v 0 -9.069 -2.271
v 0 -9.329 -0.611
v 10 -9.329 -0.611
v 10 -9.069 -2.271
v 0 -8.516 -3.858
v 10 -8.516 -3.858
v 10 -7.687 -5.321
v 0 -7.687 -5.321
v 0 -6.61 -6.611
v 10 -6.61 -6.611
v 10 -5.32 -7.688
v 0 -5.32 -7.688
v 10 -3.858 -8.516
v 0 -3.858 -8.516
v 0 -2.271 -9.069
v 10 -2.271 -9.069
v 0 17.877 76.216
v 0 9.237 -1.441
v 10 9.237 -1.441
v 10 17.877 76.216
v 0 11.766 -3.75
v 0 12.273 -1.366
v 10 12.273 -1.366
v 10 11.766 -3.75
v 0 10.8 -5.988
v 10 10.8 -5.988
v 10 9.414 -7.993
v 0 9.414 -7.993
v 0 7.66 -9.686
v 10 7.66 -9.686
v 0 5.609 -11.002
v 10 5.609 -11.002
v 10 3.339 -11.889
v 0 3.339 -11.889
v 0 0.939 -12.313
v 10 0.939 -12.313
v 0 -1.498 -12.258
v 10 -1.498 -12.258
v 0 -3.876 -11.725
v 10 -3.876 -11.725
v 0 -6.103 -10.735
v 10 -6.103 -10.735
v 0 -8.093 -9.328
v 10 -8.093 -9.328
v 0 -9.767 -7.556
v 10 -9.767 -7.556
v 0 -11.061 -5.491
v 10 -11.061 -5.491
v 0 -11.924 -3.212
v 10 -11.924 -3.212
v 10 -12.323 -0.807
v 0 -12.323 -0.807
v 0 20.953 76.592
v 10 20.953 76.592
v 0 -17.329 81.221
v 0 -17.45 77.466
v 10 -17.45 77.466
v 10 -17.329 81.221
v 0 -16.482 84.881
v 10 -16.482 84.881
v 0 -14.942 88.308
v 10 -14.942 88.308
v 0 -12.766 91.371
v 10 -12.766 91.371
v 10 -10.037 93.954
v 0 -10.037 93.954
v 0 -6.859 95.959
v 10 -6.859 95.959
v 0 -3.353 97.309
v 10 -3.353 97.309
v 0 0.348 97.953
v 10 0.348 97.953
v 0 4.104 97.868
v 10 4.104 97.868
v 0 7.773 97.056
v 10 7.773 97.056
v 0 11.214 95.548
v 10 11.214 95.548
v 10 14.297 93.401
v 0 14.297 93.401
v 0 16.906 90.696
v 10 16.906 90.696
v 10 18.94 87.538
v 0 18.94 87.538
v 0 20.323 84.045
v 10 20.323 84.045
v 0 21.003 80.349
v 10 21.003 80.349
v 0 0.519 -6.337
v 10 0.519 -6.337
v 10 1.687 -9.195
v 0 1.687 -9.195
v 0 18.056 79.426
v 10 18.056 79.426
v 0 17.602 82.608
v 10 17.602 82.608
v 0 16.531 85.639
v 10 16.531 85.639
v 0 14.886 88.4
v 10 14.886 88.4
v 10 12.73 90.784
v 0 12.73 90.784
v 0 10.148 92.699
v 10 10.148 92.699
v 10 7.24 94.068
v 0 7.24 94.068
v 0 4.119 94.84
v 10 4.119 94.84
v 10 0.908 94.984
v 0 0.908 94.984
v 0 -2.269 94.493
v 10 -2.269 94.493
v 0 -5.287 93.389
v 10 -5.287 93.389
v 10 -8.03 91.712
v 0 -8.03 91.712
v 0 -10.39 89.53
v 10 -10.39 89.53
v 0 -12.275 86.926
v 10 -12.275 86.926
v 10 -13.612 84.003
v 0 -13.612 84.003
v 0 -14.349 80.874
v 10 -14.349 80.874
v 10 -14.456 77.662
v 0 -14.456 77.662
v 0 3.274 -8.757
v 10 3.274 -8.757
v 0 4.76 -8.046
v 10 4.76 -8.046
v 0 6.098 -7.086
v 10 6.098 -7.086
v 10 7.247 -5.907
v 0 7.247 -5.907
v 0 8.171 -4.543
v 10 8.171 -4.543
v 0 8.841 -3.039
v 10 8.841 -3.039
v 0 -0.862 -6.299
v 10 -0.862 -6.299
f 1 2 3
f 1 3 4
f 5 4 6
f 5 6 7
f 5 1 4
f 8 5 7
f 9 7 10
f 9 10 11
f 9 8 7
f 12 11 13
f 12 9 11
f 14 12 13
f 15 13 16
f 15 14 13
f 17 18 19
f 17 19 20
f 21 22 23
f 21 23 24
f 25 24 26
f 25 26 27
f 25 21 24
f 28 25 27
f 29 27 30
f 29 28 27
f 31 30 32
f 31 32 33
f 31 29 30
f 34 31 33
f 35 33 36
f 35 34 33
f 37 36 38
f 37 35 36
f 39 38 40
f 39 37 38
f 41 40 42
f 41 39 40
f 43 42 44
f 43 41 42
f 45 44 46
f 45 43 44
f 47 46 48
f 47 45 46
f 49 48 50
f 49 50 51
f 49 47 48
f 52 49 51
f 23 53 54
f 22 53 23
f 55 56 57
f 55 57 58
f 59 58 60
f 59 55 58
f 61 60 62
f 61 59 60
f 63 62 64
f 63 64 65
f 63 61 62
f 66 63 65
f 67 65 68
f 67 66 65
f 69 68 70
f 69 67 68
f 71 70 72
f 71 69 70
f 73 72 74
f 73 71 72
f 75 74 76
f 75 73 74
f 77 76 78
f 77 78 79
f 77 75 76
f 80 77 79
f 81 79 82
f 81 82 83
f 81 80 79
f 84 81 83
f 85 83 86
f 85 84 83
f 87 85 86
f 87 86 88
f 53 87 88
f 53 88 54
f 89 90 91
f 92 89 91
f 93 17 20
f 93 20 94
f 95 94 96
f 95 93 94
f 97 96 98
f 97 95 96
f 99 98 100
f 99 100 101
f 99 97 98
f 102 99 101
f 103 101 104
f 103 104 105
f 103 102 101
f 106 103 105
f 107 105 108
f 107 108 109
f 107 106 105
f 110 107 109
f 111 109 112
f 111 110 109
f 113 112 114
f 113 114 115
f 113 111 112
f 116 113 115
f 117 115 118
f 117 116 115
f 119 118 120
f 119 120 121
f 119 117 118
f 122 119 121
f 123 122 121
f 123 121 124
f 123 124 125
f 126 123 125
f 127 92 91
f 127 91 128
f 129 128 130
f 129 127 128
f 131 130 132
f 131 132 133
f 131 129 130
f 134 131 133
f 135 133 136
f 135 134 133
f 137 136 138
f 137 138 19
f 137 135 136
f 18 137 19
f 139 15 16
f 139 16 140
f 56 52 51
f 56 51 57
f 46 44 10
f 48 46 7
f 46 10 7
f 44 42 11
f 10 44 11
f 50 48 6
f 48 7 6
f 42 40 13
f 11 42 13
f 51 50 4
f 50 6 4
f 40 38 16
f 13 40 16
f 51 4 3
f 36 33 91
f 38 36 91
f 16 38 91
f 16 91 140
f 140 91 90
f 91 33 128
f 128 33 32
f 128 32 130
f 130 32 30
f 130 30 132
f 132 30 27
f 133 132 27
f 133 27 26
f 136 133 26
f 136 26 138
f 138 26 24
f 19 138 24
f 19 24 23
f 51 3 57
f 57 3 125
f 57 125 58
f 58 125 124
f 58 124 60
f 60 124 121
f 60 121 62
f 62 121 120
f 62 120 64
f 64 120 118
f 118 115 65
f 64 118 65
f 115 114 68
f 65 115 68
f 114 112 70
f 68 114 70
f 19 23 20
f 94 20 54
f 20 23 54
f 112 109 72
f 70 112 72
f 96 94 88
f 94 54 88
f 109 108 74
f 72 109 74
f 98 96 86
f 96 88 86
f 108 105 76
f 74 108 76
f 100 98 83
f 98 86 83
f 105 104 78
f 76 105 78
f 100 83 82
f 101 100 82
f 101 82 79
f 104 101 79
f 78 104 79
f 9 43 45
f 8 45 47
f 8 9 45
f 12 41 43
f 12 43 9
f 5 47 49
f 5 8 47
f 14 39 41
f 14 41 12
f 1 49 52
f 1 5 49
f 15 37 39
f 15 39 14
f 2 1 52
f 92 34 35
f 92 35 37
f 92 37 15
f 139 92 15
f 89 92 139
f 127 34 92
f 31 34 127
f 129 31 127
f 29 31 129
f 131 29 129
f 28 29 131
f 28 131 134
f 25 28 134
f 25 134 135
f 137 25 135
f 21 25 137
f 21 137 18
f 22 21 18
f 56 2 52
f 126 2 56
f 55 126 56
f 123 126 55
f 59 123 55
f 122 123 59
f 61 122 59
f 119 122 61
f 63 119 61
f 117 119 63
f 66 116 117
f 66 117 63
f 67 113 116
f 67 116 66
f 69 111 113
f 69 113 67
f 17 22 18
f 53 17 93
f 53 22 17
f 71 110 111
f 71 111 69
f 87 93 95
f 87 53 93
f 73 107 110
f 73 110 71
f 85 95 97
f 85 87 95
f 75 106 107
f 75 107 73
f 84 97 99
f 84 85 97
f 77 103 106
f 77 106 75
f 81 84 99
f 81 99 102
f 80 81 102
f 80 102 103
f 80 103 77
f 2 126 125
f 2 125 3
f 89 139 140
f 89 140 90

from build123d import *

# Parameters (mm, degrees)
BOSS_EXTRUDE1_DEPTH = 10
BOSS_EXTRUDE2_DEPTH = 10


with BuildPart() as part:
    # Sketch1 → Boss-Extrude1 (new body)
    with BuildSketch(Plane(origin=(0, 0, 0), x_dir=(0, 0, -1), z_dir=(1, 0, 0))):
        with BuildLine():
            Line((-76.592461771, 20.953089015), (1.366493243, 12.273096648))
            ThreePointArc((1.366493243, 12.273096648), (12.345744217, -0.280722022), (0.807229086, -12.322523537))
            Line((0.807229086, -12.322523537), (-77.465686513, -17.45005881))
            ThreePointArc((-77.465686513, -17.45005881), (-98.002496493, 2.228416408), (-76.592461771, 20.953089015))
        make_face()
        with BuildLine():
            Line((-77.661791455, -14.456475197), (0.611124144, -9.328939923))
            ThreePointArc((0.611124144, -9.328939923), (9.339609214, -0.417483589), (1.441037018, 9.237207648))
            Line((1.441037018, 9.237207648), (-76.216477855, 17.876925629))
            ThreePointArc((-76.216477855, 17.876925629), (-94.991237369, 2.517160117), (-77.661791455, -14.456475197))
        make_face(mode=Mode.SUBTRACT)
    extrude(amount=BOSS_EXTRUDE1_DEPTH)

    # Sketch2 → Boss-Extrude2 (add)
    with BuildSketch(Plane.ZY):
        with BuildLine():
            Line((-6.336674596, 0.518546587), (-9.195436771, 1.687167861))
            ThreePointArc((-9.195436771, 1.687167861), (-9.3441708, -0.298437374), (-9.069035243, -2.270504914))
            Line((-9.069035243, -2.270504914), (-6.299160688, -0.86192234))
            Line((-6.299160688, -0.86192234), (-6.336674596, 0.518546587))
        make_face()
    extrude(amount=-BOSS_EXTRUDE2_DEPTH)


solid = part.part
